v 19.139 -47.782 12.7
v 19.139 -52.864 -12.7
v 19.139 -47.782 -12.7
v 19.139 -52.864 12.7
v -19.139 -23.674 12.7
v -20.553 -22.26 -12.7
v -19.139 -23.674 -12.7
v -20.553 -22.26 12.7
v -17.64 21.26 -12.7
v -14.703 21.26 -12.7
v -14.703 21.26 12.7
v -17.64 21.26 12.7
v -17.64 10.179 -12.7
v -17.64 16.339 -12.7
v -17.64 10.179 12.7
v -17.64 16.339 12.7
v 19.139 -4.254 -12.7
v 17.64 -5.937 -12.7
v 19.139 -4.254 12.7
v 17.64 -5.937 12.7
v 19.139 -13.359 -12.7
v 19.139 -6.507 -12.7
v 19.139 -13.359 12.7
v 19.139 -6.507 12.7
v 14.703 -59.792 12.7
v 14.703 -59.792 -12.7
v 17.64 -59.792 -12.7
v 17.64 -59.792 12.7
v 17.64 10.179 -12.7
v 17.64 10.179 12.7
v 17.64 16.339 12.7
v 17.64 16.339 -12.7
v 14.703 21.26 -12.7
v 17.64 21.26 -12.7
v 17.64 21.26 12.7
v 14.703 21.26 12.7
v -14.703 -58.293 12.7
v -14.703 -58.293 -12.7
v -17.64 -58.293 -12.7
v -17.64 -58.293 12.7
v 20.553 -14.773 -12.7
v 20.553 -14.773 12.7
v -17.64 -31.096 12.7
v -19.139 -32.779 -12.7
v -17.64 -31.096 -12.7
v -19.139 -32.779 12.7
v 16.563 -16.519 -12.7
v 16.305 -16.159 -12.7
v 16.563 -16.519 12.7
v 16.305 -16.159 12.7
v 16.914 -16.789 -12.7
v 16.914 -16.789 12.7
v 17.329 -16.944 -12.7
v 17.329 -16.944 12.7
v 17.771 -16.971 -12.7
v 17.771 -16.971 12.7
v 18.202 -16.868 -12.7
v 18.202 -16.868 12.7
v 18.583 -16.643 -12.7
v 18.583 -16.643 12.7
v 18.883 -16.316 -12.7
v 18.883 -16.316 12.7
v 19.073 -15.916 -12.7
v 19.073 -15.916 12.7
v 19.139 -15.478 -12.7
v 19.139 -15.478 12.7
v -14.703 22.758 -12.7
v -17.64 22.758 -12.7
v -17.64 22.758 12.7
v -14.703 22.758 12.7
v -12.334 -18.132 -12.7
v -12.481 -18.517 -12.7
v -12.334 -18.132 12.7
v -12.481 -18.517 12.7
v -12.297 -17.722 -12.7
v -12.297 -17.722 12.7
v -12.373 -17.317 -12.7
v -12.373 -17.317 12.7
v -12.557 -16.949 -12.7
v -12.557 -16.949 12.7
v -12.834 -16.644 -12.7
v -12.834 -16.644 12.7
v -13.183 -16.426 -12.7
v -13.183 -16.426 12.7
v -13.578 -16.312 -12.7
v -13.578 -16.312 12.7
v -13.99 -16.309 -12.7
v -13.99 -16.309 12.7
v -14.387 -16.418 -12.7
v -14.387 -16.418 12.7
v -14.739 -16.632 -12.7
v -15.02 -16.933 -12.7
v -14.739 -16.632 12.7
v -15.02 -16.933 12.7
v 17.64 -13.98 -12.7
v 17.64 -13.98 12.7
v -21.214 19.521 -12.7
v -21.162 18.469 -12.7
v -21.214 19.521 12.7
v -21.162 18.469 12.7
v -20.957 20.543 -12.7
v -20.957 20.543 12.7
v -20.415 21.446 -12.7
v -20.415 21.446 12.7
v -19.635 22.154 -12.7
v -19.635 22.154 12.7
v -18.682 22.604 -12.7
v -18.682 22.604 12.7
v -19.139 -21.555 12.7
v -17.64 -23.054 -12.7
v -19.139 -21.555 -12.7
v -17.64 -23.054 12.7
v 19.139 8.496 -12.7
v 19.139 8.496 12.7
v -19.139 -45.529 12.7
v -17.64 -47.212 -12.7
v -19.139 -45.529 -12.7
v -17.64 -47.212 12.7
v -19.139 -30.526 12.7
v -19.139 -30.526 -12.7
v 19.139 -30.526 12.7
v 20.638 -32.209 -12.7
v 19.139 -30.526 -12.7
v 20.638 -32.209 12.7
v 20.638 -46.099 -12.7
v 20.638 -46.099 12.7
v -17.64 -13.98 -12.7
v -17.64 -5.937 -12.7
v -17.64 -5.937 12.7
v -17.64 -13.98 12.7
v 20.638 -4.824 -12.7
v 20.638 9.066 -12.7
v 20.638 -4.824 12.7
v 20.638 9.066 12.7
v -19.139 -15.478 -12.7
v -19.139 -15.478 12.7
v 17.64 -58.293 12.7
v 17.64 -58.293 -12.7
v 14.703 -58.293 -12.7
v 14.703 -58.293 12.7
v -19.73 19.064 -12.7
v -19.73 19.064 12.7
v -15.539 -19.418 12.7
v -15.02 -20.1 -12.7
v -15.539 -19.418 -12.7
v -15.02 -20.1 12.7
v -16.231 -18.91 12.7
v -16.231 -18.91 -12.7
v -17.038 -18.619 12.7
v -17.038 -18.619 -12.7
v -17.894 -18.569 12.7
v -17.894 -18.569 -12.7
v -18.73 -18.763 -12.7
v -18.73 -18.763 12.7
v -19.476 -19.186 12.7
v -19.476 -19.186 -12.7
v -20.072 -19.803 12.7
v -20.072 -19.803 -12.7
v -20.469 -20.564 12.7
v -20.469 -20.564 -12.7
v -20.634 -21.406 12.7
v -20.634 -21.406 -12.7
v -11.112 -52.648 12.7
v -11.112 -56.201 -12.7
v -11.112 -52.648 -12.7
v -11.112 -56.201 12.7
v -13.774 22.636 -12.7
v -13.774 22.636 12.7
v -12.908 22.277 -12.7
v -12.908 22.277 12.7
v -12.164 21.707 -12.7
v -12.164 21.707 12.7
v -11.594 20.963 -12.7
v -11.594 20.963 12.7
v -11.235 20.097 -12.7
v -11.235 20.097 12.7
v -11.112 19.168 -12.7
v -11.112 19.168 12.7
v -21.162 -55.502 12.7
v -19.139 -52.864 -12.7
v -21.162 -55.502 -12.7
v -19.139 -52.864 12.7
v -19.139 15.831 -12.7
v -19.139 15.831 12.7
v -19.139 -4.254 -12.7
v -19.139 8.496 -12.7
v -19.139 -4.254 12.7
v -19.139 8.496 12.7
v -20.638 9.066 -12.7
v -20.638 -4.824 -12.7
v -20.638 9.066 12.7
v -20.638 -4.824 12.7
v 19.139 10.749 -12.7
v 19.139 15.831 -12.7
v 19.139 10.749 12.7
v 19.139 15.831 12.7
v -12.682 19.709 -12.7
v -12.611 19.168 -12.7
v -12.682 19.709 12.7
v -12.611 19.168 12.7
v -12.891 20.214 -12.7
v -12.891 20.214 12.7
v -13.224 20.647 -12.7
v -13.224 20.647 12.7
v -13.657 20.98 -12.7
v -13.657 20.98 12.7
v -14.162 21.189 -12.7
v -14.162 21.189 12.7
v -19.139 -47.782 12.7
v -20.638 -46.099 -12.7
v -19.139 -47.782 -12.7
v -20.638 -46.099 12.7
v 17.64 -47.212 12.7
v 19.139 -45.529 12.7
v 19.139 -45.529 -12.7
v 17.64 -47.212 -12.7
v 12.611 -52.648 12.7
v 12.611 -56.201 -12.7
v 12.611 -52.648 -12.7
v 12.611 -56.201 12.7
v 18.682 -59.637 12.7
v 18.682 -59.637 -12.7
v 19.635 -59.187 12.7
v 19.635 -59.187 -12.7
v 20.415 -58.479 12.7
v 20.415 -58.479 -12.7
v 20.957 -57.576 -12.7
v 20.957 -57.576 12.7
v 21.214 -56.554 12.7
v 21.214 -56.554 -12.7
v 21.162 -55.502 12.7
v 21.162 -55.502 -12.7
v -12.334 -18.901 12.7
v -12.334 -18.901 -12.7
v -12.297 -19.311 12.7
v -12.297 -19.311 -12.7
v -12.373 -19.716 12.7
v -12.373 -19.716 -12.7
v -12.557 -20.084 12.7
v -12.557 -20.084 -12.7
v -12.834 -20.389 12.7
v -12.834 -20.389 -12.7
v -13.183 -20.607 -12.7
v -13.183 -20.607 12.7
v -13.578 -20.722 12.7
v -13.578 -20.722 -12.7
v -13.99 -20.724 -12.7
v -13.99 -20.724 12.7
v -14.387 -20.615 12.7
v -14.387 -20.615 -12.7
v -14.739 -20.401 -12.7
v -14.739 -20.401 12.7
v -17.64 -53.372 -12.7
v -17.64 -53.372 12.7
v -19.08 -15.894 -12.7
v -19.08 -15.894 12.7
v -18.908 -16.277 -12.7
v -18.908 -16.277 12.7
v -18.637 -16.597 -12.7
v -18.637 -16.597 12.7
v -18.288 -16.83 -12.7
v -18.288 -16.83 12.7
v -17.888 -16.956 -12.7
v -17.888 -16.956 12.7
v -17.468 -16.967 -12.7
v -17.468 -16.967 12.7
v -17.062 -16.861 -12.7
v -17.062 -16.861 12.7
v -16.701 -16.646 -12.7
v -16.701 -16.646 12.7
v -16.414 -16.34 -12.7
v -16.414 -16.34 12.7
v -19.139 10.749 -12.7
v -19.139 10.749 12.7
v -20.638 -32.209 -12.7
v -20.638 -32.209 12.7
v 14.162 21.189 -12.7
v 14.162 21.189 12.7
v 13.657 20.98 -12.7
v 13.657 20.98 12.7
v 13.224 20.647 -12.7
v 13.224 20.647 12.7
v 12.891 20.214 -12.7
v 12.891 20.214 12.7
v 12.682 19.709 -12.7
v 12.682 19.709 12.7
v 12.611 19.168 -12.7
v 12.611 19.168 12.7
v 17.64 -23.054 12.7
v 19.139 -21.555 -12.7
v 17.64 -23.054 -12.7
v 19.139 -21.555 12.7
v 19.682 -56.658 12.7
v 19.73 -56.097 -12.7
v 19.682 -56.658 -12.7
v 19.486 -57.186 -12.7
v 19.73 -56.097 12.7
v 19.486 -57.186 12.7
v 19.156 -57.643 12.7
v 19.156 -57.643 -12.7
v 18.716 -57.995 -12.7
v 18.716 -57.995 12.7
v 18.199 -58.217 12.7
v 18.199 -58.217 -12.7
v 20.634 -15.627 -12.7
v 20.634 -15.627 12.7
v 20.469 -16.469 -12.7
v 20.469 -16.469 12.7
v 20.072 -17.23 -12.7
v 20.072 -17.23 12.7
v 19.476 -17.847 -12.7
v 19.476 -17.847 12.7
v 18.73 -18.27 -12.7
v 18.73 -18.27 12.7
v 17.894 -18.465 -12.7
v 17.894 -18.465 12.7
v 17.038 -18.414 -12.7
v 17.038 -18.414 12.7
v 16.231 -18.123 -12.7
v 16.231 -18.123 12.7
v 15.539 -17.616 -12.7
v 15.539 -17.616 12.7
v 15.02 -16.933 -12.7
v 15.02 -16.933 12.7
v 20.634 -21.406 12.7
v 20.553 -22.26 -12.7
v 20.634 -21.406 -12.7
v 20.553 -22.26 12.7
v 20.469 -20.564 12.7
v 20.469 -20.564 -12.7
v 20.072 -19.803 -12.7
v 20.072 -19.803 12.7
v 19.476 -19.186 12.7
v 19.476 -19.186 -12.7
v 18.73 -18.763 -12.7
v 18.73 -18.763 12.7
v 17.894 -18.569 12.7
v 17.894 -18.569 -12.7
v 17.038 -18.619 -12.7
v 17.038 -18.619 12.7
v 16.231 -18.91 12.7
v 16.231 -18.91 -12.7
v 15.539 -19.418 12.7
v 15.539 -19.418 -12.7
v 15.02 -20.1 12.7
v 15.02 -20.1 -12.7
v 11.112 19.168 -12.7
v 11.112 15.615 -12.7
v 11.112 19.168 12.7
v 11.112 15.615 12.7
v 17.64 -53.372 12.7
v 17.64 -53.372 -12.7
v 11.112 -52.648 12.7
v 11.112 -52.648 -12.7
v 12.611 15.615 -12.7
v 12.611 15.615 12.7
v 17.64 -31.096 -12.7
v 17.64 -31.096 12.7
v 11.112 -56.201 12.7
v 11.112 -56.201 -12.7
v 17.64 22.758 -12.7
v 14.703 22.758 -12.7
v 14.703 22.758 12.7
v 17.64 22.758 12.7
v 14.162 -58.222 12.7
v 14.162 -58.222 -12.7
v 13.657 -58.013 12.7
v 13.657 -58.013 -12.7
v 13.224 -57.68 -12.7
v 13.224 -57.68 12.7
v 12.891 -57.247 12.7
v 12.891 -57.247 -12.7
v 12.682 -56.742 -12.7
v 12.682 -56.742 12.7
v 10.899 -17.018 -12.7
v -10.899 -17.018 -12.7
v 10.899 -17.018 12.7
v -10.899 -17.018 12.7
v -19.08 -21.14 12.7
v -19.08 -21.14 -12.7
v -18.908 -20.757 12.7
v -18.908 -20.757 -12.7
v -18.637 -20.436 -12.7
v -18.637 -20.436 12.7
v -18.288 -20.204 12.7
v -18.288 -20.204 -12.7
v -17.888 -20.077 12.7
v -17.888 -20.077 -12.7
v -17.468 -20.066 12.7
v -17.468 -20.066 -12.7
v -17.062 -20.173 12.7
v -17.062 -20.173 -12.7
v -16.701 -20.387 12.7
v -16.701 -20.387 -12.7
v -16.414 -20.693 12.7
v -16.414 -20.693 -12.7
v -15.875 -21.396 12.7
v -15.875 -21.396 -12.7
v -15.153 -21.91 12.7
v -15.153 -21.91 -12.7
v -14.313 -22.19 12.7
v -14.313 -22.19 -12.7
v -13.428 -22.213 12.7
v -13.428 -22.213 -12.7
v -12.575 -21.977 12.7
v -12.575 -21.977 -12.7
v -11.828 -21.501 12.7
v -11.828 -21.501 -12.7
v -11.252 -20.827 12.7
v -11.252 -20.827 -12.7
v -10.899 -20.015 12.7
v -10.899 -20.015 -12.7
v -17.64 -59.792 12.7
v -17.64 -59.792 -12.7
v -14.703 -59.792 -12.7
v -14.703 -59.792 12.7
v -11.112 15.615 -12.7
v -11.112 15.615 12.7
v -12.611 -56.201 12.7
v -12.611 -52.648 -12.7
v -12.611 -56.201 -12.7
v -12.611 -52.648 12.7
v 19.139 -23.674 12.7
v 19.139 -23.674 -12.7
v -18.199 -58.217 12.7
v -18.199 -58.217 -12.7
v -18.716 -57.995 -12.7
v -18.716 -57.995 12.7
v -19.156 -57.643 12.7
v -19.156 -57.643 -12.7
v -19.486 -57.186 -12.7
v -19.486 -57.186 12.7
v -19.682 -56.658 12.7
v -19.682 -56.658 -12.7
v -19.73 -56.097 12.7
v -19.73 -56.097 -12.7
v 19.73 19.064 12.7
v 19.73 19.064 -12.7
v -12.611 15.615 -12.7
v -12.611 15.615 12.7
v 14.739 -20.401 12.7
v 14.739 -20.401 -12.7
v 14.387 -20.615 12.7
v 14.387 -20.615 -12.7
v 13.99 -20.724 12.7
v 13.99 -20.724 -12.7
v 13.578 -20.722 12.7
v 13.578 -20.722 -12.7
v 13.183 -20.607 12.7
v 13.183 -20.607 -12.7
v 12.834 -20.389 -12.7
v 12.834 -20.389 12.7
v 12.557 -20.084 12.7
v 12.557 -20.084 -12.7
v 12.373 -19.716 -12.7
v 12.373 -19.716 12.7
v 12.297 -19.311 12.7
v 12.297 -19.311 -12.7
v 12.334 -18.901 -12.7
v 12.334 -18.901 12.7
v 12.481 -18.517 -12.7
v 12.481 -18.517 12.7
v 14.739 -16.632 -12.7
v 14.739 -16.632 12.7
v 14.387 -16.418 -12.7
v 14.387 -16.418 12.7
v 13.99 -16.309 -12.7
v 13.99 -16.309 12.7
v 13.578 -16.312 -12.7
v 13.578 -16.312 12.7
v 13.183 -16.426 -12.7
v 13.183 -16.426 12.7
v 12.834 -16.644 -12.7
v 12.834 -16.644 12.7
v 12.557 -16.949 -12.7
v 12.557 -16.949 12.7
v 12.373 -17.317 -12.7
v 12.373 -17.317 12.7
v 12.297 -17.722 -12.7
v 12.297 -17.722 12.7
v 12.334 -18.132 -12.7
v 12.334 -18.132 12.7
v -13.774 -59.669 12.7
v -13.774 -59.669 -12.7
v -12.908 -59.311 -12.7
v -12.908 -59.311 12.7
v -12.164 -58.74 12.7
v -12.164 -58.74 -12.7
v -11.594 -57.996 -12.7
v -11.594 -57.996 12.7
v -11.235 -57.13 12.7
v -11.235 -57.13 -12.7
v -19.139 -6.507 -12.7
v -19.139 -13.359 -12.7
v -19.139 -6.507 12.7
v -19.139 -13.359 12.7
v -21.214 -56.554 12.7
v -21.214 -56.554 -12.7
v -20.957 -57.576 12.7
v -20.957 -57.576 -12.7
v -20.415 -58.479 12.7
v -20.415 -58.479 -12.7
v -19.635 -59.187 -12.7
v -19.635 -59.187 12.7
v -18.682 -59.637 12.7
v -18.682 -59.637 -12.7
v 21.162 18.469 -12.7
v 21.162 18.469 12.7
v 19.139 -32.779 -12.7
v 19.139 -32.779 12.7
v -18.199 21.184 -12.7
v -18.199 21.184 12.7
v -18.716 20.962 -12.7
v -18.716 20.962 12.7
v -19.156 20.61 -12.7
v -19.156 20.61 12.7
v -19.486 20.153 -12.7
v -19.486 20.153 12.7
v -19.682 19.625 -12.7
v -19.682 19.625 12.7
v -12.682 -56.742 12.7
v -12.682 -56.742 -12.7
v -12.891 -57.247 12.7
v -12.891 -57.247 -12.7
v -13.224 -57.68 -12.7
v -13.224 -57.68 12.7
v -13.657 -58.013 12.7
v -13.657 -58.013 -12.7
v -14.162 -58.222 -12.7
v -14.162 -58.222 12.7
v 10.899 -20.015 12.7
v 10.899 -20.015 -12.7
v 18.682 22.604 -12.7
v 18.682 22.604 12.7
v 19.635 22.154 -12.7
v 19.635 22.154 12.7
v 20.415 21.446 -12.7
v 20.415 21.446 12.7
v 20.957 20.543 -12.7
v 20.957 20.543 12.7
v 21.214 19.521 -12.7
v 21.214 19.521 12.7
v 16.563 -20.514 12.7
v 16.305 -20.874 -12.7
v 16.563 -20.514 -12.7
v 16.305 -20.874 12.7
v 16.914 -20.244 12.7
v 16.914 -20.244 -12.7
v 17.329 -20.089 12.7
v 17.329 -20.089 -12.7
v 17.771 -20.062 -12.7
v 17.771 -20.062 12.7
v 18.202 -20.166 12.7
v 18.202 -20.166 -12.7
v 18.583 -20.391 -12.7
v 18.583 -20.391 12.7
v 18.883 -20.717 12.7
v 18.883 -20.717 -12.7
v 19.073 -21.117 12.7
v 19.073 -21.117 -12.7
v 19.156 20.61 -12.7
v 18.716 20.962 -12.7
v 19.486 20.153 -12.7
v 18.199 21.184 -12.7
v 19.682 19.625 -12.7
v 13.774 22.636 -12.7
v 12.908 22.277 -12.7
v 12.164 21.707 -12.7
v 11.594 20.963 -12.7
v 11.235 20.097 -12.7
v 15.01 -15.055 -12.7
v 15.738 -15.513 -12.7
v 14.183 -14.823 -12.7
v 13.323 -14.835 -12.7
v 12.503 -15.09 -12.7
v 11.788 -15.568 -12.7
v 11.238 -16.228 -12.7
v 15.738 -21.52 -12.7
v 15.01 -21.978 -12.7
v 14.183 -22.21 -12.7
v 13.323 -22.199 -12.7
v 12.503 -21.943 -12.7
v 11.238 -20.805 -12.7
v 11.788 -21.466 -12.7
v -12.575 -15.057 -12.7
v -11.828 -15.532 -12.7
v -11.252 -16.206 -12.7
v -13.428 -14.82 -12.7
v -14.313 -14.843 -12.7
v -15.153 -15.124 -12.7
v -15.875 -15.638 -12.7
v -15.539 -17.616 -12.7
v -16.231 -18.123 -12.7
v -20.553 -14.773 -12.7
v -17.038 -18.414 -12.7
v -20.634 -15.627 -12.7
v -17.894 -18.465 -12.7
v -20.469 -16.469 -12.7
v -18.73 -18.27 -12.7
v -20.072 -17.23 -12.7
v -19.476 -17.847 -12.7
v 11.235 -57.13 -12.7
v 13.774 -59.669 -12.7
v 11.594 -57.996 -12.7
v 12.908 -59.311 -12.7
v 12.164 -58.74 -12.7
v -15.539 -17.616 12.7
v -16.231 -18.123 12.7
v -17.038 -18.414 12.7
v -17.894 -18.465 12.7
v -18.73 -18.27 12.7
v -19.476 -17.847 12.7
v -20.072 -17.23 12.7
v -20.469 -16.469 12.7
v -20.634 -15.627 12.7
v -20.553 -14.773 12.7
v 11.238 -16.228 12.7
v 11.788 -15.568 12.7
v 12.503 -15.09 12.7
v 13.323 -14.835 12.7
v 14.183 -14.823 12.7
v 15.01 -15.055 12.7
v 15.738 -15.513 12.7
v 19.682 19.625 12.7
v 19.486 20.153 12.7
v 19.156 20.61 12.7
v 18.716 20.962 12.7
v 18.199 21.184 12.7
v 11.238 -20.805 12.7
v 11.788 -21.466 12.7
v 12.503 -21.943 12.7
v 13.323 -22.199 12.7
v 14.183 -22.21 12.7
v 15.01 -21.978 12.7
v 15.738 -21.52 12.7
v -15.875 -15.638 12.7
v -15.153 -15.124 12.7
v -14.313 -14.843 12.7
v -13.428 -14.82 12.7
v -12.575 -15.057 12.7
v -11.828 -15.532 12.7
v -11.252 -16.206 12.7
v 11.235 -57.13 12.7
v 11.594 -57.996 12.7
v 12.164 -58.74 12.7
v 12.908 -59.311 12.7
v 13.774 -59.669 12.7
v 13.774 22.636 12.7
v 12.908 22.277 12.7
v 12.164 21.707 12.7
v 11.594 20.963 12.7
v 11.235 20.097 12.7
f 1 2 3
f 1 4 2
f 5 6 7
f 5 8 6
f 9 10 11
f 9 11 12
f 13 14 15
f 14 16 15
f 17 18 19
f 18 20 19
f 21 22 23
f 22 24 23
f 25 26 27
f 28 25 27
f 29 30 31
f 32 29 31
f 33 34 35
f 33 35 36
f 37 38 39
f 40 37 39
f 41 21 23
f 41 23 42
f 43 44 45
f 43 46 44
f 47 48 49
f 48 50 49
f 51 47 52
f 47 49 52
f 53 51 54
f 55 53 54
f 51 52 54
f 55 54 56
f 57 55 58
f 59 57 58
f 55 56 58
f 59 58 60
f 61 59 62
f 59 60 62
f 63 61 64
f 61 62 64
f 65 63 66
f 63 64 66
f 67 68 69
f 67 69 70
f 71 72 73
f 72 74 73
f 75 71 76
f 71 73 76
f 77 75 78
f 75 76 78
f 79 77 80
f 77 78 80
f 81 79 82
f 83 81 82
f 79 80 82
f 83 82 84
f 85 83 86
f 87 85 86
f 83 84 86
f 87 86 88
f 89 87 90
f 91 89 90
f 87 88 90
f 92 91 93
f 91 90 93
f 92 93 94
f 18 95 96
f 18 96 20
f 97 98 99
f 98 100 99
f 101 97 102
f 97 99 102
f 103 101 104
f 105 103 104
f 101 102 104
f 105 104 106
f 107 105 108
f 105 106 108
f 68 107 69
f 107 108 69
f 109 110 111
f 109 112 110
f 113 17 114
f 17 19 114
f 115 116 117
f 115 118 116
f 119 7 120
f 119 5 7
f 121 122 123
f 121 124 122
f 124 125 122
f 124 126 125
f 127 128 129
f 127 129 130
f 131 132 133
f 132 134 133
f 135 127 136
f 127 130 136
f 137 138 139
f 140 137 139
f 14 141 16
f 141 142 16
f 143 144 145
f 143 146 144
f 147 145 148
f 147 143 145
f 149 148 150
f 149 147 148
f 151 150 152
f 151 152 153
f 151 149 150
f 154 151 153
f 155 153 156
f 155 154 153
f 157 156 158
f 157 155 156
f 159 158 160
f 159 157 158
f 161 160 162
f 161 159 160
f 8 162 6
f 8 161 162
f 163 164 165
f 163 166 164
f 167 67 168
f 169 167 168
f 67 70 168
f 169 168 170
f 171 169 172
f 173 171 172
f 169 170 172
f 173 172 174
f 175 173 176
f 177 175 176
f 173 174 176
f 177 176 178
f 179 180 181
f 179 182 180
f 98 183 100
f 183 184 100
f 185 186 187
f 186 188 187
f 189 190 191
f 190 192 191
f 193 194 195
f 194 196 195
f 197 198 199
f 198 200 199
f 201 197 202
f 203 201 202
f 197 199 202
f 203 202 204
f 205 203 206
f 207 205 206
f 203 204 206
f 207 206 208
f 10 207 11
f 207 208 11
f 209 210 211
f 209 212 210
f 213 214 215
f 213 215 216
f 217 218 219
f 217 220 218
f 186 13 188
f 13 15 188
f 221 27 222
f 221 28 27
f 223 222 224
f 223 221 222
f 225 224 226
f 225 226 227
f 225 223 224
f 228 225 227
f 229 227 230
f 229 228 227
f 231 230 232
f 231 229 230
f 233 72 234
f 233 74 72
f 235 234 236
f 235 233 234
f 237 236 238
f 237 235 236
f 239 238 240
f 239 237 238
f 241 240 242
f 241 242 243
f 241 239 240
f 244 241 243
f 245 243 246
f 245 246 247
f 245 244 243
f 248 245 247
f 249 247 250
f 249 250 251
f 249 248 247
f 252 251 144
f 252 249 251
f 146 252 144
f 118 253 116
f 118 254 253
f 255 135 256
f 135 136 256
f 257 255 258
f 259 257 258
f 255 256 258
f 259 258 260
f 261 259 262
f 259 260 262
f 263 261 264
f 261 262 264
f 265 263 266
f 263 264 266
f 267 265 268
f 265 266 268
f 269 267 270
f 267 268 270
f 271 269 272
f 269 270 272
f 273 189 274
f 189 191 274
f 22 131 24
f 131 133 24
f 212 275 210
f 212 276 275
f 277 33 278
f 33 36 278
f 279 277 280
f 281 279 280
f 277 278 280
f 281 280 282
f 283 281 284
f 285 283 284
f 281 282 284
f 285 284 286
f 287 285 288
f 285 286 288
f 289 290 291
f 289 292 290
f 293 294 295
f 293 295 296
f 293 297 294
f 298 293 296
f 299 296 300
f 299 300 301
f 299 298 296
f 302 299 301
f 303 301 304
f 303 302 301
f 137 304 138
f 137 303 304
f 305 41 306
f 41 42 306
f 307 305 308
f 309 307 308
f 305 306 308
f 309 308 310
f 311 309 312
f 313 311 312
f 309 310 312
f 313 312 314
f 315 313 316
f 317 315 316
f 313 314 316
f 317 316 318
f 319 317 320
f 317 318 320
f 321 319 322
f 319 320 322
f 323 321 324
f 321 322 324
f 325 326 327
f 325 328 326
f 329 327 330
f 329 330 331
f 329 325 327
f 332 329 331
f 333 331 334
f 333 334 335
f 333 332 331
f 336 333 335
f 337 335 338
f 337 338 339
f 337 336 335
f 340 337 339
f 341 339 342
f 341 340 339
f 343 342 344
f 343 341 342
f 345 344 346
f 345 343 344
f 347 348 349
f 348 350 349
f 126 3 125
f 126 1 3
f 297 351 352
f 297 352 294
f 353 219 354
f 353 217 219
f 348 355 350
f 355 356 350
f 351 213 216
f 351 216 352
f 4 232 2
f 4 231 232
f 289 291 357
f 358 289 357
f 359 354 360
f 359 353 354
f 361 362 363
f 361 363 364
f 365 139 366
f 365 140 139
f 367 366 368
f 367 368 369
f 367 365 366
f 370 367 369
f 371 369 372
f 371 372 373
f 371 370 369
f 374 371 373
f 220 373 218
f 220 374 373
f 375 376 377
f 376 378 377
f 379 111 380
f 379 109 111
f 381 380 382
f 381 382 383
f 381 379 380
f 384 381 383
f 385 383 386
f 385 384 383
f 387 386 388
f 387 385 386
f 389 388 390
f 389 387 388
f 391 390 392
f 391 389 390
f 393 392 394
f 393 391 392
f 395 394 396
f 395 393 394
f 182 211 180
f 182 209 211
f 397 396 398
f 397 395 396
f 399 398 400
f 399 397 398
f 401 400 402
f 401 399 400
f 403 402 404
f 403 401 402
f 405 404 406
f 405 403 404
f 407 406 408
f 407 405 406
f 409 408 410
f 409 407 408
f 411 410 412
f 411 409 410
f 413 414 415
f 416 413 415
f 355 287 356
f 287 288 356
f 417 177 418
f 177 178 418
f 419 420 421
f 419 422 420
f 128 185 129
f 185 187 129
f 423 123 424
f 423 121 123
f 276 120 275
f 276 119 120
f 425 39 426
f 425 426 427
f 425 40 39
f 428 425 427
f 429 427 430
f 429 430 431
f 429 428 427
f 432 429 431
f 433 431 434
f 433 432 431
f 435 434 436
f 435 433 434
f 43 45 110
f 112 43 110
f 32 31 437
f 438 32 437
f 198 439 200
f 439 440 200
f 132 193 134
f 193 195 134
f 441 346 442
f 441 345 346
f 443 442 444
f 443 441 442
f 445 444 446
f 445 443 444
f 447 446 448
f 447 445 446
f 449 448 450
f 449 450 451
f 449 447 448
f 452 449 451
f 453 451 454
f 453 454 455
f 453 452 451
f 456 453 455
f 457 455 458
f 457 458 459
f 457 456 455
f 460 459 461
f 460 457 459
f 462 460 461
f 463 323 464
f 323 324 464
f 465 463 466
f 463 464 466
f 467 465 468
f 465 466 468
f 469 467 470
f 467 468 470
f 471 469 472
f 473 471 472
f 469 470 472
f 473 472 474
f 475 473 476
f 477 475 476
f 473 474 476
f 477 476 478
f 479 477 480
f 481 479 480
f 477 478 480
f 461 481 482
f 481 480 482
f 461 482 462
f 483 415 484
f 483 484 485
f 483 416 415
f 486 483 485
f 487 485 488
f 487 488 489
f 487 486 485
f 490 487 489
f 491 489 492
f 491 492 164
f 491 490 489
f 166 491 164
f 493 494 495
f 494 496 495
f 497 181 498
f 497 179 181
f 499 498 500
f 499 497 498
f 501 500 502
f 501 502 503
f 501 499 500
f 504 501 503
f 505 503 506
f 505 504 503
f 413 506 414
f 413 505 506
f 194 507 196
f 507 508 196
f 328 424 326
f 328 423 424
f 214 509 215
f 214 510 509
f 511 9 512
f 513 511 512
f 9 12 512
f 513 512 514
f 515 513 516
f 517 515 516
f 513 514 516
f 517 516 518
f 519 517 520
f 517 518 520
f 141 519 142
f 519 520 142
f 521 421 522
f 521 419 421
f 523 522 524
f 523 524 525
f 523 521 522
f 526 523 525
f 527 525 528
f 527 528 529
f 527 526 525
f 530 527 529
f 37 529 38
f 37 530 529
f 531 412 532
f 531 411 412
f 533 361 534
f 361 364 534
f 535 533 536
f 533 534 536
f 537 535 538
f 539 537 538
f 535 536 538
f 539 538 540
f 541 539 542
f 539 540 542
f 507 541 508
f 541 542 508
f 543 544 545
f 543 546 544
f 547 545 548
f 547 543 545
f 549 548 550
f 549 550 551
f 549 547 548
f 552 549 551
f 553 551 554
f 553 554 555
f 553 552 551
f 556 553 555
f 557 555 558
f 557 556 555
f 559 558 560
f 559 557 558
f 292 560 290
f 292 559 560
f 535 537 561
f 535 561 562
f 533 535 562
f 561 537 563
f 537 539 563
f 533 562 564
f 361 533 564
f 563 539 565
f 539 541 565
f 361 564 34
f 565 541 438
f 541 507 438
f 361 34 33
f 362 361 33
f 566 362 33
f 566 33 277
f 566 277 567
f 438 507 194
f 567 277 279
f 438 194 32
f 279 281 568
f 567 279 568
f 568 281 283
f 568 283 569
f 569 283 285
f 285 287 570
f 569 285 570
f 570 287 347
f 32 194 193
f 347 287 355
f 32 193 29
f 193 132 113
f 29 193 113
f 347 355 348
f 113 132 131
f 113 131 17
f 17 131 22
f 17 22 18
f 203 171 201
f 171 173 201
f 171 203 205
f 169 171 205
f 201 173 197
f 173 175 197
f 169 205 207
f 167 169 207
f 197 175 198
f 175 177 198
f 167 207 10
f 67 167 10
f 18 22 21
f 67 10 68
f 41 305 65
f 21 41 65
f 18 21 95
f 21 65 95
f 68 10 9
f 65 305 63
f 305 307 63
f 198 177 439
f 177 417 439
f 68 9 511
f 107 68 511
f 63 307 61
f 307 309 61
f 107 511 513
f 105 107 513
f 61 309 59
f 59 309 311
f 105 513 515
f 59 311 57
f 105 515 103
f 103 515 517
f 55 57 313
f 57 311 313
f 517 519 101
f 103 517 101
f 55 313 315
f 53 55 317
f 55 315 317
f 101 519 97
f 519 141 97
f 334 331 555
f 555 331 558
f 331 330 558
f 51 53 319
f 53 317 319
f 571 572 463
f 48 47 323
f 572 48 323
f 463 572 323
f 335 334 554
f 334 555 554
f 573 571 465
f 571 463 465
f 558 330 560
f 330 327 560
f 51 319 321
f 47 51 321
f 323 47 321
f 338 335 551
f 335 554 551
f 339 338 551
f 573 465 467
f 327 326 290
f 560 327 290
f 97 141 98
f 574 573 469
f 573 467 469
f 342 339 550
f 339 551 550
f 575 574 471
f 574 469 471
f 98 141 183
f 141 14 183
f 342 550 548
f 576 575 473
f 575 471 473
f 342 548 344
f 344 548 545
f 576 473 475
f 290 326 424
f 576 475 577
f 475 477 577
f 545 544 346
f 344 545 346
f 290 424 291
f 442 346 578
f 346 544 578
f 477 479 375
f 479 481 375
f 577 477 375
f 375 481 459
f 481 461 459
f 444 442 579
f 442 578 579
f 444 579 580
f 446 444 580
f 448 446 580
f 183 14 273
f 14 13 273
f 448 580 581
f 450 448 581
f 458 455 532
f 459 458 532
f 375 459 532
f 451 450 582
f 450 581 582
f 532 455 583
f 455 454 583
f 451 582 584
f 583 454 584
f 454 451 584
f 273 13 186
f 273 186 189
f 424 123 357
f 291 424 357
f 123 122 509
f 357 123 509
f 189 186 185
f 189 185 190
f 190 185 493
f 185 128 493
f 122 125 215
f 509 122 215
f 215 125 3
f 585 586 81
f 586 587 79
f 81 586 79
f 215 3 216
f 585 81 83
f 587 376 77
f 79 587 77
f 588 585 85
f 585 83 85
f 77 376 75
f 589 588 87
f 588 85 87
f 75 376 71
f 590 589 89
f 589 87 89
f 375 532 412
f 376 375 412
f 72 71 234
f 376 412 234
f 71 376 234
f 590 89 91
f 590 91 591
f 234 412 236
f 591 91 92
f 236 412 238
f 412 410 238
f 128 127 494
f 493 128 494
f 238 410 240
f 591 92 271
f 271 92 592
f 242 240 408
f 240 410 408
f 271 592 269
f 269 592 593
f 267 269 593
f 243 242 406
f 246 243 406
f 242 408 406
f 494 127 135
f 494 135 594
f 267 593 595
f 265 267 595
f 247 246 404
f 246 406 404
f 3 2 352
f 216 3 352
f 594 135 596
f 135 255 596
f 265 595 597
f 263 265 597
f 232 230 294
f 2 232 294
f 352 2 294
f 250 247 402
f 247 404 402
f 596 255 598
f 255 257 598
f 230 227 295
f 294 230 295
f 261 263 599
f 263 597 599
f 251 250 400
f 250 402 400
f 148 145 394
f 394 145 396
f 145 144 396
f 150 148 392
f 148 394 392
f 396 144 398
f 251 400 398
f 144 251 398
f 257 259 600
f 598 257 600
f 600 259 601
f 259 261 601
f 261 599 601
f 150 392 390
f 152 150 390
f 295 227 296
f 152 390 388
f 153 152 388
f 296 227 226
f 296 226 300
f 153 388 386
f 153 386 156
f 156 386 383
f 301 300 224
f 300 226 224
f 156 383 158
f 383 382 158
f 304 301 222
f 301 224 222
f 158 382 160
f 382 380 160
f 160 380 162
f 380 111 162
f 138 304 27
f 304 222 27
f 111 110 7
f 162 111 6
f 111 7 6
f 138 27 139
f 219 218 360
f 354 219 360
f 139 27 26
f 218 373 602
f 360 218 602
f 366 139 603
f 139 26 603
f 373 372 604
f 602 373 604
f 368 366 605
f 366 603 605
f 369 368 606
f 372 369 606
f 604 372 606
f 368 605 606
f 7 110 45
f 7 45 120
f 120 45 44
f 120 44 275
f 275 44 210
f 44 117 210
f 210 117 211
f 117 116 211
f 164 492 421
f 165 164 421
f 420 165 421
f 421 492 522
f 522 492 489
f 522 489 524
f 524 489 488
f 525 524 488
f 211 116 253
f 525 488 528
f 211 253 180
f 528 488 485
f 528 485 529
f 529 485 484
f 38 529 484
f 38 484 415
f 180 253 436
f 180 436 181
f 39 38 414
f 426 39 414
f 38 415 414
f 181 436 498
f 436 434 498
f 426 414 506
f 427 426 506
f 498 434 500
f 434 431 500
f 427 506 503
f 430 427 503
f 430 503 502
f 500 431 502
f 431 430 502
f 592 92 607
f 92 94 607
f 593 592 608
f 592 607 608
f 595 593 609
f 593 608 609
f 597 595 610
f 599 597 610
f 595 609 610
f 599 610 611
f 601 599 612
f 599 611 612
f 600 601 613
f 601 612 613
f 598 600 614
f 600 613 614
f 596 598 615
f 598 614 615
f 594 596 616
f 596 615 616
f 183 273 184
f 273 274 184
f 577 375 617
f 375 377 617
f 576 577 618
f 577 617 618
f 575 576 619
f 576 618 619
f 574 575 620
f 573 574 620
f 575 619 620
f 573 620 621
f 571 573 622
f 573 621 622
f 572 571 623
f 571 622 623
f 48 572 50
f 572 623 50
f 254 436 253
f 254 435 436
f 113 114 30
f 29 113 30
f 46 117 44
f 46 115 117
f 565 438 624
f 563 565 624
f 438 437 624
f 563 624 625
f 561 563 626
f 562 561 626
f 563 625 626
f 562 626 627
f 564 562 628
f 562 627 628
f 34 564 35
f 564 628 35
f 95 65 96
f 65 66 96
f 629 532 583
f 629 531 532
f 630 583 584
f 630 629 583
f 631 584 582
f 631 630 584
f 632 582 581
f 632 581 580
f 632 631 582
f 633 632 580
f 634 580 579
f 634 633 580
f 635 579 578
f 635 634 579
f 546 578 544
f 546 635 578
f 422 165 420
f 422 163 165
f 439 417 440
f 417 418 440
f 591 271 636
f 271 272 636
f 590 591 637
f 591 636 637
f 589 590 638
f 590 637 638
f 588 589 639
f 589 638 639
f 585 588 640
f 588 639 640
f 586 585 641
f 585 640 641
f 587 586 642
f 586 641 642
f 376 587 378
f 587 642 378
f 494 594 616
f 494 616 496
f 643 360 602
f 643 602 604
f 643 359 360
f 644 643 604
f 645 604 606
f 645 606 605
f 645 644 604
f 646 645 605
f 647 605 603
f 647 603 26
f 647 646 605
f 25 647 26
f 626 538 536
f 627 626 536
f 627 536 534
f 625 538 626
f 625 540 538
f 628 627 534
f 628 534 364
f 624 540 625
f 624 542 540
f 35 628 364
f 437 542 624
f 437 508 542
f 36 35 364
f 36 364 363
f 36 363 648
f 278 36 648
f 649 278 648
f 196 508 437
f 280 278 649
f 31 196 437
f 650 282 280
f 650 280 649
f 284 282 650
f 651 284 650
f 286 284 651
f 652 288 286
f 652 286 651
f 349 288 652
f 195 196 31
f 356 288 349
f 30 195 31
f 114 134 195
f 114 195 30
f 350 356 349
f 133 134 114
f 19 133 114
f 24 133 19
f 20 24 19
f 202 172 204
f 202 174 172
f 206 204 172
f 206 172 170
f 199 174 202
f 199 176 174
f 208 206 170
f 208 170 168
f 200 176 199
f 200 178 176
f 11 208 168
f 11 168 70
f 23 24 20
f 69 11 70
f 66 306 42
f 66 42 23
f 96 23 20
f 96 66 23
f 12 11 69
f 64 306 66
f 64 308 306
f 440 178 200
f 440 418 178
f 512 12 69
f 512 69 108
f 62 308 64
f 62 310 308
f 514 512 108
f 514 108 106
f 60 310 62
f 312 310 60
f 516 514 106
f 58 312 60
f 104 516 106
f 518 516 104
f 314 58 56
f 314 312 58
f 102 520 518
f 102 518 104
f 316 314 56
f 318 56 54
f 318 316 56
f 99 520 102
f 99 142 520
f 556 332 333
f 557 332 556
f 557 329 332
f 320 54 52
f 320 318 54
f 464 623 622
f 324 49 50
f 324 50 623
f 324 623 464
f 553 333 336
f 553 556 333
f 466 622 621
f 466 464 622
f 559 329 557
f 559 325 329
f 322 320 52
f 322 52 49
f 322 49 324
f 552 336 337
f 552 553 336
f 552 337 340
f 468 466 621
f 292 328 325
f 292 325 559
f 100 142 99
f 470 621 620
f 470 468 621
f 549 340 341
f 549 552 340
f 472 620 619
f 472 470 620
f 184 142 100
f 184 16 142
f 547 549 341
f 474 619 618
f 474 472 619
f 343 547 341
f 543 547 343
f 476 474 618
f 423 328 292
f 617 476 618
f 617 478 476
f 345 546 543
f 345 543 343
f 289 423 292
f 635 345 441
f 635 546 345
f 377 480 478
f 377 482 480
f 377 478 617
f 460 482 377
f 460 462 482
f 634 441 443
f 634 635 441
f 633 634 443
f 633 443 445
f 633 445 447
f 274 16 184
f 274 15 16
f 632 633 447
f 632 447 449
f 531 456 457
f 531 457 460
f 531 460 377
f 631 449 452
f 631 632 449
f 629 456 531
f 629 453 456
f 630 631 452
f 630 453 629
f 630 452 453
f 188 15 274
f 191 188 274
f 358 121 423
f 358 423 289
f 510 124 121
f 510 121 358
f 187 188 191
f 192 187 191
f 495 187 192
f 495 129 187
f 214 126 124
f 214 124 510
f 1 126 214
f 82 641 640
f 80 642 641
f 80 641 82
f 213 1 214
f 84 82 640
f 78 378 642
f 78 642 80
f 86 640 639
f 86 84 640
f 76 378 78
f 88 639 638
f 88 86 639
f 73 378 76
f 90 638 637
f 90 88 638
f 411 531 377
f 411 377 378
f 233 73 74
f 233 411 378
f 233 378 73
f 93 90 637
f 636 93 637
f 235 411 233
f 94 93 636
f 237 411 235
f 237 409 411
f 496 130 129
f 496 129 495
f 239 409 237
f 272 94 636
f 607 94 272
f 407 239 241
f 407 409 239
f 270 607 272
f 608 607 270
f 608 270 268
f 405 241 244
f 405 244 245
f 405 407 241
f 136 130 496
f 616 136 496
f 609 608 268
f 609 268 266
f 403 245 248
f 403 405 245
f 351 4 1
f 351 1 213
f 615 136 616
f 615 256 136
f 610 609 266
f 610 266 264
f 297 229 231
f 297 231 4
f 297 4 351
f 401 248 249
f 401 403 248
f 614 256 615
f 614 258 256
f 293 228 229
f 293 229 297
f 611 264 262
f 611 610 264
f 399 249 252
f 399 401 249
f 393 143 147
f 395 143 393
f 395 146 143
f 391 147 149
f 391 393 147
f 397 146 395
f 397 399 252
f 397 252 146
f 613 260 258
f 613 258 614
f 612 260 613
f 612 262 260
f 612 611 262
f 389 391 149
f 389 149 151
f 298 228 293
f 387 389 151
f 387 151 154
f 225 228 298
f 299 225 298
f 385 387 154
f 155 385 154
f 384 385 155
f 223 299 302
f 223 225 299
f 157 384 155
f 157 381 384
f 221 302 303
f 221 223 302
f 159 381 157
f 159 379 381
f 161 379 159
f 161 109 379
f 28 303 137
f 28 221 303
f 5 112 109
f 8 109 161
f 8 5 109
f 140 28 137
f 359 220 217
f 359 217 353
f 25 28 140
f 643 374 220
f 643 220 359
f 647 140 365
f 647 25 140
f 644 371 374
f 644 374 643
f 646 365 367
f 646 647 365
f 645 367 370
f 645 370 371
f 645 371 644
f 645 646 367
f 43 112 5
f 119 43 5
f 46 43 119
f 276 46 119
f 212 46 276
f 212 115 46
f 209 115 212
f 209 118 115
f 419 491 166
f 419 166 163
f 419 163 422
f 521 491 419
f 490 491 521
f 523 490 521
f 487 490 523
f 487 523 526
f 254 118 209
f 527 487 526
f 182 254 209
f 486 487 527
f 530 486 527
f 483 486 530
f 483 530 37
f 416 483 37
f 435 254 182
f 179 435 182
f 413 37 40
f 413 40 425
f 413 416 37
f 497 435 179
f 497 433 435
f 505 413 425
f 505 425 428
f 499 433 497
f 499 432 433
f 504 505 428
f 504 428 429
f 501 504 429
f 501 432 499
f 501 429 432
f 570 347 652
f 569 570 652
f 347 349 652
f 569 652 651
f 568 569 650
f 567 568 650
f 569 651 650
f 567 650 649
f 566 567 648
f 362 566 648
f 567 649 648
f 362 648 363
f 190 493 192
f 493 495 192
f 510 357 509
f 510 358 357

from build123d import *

# Parameters (mm, degrees)
BASE_EXTRUDE_DEPTH = 12.7


with BuildPart() as part:
    # Sketch1 → Base-Extrude (new, symmetric)
    with BuildSketch(Plane.XY):
        with BuildLine():
            Line((17.6403, 16.339286512), (19.729882578, 19.063533504))
            ThreePointArc((19.729882578, 19.063533504), (19.156045845, 20.609744632), (17.6403, 21.2598))
            Line((17.6403, 21.2598), (14.70327367, 21.2598))
            ThreePointArc((14.70327367, 21.2598), (13.223883481, 20.647016519), (12.6111, 19.16762633))
            Line((12.6111, 19.16762633), (12.6111, 15.61465))
            Line((12.6111, 15.61465), (11.1125, 15.61465))
            Line((11.1125, 15.61465), (11.1125, 19.16762633))
            ThreePointArc((11.1125, 19.16762633), (12.164213258, 21.706686742), (14.70327367, 22.7584))
            Line((14.70327367, 22.7584), (17.6403, 22.7584))
            ThreePointArc((17.6403, 22.7584), (20.415434554, 21.446284653), (21.162428673, 18.4688666))
            Line((21.162428673, 18.4688666), (19.1389, 15.830735923))
            Line((19.1389, 15.830735923), (19.1389, 10.749129415))
            Line((19.1389, 10.749129415), (20.6375, 9.0662125))
            Line((20.6375, 9.0662125), (20.6375, -4.8244125))
            Line((20.6375, -4.8244125), (19.1389, -6.507329415))
            Line((19.1389, -6.507329415), (19.1389, -13.358784555))
            Line((19.1389, -13.358784555), (20.553458003, -14.773342558))
            ThreePointArc((20.553458003, -14.773342558), (18.729942105, -18.270236732), (15.019825564, -16.932883251))
            ThreePointArc((15.019825564, -16.932883251), (13.000752562, -16.523120627), (12.480559153, -18.5166))
            Line((12.480559153, -18.5166), (-12.480559153, -18.5166))
            ThreePointArc((-12.480559153, -18.5166), (-13.000752562, -16.523120627), (-15.019825564, -16.932883251))
            ThreePointArc((-15.019825564, -16.932883251), (-18.729942105, -18.270236732), (-20.553458003, -14.773342558))
            Line((-20.553458003, -14.773342558), (-19.1389, -13.358784555))
            Line((-19.1389, -13.358784555), (-19.1389, -6.507329415))
            Line((-19.1389, -6.507329415), (-20.6375, -4.8244125))
            Line((-20.6375, -4.8244125), (-20.6375, 9.0662125))
            Line((-20.6375, 9.0662125), (-19.1389, 10.749129415))
            Line((-19.1389, 10.749129415), (-19.1389, 15.830735923))
            Line((-19.1389, 15.830735923), (-21.162428673, 18.4688666))
            ThreePointArc((-21.162428673, 18.4688666), (-20.415434554, 21.446284653), (-17.6403, 22.7584))
            Line((-17.6403, 22.7584), (-14.70327367, 22.7584))
            ThreePointArc((-14.70327367, 22.7584), (-12.164213258, 21.706686742), (-11.1125, 19.16762633))
            Line((-11.1125, 19.16762633), (-11.1125, 15.61465))
            Line((-11.1125, 15.61465), (-12.6111, 15.61465))
            Line((-12.6111, 15.61465), (-12.6111, 19.16762633))
            ThreePointArc((-12.6111, 19.16762633), (-13.223883481, 20.647016519), (-14.70327367, 21.2598))
            Line((-14.70327367, 21.2598), (-17.6403, 21.2598))
            ThreePointArc((-17.6403, 21.2598), (-19.156045845, 20.609744632), (-19.729882578, 19.063533504))
            Line((-19.729882578, 19.063533504), (-17.6403, 16.339286512))
            Line((-17.6403, 16.339286512), (-17.6403, 10.17860201))
            Line((-17.6403, 10.17860201), (-19.1389, 8.495685095))
            Line((-19.1389, 8.495685095), (-19.1389, -4.253885095))
            Line((-19.1389, -4.253885095), (-17.6403, -5.93680201))
            Line((-17.6403, -5.93680201), (-17.6403, -13.979525))
            Line((-17.6403, -13.979525), (-19.1389, -15.478125))
            ThreePointArc((-19.1389, -15.478125), (-18.092238669, -16.906954381), (-16.414285827, -16.33992034))
            ThreePointArc((-16.414285827, -16.33992034), (-13.428073412, -14.819877156), (-10.898992189, -17.018))
            Line((-10.898992189, -17.018), (10.898992189, -17.018))
            ThreePointArc((10.898992189, -17.018), (13.323359075, -14.834630878), (16.30518861, -16.15877141))
            ThreePointArc((16.30518861, -16.15877141), (17.990302879, -16.935279743), (19.1389, -15.478125))
            Line((19.1389, -15.478125), (17.6403, -13.979525))
            Line((17.6403, -13.979525), (17.6403, -5.93680201))
            Line((17.6403, -5.93680201), (19.1389, -4.253885095))
            Line((19.1389, -4.253885095), (19.1389, 8.495685095))
            Line((19.1389, 8.495685095), (17.6403, 10.17860201))
            Line((17.6403, 10.17860201), (17.6403, 16.339286512))
        make_face()
    base_extrude = extrude(amount=BASE_EXTRUDE_DEPTH, both=True)

    # Mirror1: Base-Extrude across plane
    add(base_extrude.mirror(Plane(origin=(0, -18.5166, 0), x_dir=(0, 0, 1), z_dir=(0, -1, 0))))


solid = part.part
